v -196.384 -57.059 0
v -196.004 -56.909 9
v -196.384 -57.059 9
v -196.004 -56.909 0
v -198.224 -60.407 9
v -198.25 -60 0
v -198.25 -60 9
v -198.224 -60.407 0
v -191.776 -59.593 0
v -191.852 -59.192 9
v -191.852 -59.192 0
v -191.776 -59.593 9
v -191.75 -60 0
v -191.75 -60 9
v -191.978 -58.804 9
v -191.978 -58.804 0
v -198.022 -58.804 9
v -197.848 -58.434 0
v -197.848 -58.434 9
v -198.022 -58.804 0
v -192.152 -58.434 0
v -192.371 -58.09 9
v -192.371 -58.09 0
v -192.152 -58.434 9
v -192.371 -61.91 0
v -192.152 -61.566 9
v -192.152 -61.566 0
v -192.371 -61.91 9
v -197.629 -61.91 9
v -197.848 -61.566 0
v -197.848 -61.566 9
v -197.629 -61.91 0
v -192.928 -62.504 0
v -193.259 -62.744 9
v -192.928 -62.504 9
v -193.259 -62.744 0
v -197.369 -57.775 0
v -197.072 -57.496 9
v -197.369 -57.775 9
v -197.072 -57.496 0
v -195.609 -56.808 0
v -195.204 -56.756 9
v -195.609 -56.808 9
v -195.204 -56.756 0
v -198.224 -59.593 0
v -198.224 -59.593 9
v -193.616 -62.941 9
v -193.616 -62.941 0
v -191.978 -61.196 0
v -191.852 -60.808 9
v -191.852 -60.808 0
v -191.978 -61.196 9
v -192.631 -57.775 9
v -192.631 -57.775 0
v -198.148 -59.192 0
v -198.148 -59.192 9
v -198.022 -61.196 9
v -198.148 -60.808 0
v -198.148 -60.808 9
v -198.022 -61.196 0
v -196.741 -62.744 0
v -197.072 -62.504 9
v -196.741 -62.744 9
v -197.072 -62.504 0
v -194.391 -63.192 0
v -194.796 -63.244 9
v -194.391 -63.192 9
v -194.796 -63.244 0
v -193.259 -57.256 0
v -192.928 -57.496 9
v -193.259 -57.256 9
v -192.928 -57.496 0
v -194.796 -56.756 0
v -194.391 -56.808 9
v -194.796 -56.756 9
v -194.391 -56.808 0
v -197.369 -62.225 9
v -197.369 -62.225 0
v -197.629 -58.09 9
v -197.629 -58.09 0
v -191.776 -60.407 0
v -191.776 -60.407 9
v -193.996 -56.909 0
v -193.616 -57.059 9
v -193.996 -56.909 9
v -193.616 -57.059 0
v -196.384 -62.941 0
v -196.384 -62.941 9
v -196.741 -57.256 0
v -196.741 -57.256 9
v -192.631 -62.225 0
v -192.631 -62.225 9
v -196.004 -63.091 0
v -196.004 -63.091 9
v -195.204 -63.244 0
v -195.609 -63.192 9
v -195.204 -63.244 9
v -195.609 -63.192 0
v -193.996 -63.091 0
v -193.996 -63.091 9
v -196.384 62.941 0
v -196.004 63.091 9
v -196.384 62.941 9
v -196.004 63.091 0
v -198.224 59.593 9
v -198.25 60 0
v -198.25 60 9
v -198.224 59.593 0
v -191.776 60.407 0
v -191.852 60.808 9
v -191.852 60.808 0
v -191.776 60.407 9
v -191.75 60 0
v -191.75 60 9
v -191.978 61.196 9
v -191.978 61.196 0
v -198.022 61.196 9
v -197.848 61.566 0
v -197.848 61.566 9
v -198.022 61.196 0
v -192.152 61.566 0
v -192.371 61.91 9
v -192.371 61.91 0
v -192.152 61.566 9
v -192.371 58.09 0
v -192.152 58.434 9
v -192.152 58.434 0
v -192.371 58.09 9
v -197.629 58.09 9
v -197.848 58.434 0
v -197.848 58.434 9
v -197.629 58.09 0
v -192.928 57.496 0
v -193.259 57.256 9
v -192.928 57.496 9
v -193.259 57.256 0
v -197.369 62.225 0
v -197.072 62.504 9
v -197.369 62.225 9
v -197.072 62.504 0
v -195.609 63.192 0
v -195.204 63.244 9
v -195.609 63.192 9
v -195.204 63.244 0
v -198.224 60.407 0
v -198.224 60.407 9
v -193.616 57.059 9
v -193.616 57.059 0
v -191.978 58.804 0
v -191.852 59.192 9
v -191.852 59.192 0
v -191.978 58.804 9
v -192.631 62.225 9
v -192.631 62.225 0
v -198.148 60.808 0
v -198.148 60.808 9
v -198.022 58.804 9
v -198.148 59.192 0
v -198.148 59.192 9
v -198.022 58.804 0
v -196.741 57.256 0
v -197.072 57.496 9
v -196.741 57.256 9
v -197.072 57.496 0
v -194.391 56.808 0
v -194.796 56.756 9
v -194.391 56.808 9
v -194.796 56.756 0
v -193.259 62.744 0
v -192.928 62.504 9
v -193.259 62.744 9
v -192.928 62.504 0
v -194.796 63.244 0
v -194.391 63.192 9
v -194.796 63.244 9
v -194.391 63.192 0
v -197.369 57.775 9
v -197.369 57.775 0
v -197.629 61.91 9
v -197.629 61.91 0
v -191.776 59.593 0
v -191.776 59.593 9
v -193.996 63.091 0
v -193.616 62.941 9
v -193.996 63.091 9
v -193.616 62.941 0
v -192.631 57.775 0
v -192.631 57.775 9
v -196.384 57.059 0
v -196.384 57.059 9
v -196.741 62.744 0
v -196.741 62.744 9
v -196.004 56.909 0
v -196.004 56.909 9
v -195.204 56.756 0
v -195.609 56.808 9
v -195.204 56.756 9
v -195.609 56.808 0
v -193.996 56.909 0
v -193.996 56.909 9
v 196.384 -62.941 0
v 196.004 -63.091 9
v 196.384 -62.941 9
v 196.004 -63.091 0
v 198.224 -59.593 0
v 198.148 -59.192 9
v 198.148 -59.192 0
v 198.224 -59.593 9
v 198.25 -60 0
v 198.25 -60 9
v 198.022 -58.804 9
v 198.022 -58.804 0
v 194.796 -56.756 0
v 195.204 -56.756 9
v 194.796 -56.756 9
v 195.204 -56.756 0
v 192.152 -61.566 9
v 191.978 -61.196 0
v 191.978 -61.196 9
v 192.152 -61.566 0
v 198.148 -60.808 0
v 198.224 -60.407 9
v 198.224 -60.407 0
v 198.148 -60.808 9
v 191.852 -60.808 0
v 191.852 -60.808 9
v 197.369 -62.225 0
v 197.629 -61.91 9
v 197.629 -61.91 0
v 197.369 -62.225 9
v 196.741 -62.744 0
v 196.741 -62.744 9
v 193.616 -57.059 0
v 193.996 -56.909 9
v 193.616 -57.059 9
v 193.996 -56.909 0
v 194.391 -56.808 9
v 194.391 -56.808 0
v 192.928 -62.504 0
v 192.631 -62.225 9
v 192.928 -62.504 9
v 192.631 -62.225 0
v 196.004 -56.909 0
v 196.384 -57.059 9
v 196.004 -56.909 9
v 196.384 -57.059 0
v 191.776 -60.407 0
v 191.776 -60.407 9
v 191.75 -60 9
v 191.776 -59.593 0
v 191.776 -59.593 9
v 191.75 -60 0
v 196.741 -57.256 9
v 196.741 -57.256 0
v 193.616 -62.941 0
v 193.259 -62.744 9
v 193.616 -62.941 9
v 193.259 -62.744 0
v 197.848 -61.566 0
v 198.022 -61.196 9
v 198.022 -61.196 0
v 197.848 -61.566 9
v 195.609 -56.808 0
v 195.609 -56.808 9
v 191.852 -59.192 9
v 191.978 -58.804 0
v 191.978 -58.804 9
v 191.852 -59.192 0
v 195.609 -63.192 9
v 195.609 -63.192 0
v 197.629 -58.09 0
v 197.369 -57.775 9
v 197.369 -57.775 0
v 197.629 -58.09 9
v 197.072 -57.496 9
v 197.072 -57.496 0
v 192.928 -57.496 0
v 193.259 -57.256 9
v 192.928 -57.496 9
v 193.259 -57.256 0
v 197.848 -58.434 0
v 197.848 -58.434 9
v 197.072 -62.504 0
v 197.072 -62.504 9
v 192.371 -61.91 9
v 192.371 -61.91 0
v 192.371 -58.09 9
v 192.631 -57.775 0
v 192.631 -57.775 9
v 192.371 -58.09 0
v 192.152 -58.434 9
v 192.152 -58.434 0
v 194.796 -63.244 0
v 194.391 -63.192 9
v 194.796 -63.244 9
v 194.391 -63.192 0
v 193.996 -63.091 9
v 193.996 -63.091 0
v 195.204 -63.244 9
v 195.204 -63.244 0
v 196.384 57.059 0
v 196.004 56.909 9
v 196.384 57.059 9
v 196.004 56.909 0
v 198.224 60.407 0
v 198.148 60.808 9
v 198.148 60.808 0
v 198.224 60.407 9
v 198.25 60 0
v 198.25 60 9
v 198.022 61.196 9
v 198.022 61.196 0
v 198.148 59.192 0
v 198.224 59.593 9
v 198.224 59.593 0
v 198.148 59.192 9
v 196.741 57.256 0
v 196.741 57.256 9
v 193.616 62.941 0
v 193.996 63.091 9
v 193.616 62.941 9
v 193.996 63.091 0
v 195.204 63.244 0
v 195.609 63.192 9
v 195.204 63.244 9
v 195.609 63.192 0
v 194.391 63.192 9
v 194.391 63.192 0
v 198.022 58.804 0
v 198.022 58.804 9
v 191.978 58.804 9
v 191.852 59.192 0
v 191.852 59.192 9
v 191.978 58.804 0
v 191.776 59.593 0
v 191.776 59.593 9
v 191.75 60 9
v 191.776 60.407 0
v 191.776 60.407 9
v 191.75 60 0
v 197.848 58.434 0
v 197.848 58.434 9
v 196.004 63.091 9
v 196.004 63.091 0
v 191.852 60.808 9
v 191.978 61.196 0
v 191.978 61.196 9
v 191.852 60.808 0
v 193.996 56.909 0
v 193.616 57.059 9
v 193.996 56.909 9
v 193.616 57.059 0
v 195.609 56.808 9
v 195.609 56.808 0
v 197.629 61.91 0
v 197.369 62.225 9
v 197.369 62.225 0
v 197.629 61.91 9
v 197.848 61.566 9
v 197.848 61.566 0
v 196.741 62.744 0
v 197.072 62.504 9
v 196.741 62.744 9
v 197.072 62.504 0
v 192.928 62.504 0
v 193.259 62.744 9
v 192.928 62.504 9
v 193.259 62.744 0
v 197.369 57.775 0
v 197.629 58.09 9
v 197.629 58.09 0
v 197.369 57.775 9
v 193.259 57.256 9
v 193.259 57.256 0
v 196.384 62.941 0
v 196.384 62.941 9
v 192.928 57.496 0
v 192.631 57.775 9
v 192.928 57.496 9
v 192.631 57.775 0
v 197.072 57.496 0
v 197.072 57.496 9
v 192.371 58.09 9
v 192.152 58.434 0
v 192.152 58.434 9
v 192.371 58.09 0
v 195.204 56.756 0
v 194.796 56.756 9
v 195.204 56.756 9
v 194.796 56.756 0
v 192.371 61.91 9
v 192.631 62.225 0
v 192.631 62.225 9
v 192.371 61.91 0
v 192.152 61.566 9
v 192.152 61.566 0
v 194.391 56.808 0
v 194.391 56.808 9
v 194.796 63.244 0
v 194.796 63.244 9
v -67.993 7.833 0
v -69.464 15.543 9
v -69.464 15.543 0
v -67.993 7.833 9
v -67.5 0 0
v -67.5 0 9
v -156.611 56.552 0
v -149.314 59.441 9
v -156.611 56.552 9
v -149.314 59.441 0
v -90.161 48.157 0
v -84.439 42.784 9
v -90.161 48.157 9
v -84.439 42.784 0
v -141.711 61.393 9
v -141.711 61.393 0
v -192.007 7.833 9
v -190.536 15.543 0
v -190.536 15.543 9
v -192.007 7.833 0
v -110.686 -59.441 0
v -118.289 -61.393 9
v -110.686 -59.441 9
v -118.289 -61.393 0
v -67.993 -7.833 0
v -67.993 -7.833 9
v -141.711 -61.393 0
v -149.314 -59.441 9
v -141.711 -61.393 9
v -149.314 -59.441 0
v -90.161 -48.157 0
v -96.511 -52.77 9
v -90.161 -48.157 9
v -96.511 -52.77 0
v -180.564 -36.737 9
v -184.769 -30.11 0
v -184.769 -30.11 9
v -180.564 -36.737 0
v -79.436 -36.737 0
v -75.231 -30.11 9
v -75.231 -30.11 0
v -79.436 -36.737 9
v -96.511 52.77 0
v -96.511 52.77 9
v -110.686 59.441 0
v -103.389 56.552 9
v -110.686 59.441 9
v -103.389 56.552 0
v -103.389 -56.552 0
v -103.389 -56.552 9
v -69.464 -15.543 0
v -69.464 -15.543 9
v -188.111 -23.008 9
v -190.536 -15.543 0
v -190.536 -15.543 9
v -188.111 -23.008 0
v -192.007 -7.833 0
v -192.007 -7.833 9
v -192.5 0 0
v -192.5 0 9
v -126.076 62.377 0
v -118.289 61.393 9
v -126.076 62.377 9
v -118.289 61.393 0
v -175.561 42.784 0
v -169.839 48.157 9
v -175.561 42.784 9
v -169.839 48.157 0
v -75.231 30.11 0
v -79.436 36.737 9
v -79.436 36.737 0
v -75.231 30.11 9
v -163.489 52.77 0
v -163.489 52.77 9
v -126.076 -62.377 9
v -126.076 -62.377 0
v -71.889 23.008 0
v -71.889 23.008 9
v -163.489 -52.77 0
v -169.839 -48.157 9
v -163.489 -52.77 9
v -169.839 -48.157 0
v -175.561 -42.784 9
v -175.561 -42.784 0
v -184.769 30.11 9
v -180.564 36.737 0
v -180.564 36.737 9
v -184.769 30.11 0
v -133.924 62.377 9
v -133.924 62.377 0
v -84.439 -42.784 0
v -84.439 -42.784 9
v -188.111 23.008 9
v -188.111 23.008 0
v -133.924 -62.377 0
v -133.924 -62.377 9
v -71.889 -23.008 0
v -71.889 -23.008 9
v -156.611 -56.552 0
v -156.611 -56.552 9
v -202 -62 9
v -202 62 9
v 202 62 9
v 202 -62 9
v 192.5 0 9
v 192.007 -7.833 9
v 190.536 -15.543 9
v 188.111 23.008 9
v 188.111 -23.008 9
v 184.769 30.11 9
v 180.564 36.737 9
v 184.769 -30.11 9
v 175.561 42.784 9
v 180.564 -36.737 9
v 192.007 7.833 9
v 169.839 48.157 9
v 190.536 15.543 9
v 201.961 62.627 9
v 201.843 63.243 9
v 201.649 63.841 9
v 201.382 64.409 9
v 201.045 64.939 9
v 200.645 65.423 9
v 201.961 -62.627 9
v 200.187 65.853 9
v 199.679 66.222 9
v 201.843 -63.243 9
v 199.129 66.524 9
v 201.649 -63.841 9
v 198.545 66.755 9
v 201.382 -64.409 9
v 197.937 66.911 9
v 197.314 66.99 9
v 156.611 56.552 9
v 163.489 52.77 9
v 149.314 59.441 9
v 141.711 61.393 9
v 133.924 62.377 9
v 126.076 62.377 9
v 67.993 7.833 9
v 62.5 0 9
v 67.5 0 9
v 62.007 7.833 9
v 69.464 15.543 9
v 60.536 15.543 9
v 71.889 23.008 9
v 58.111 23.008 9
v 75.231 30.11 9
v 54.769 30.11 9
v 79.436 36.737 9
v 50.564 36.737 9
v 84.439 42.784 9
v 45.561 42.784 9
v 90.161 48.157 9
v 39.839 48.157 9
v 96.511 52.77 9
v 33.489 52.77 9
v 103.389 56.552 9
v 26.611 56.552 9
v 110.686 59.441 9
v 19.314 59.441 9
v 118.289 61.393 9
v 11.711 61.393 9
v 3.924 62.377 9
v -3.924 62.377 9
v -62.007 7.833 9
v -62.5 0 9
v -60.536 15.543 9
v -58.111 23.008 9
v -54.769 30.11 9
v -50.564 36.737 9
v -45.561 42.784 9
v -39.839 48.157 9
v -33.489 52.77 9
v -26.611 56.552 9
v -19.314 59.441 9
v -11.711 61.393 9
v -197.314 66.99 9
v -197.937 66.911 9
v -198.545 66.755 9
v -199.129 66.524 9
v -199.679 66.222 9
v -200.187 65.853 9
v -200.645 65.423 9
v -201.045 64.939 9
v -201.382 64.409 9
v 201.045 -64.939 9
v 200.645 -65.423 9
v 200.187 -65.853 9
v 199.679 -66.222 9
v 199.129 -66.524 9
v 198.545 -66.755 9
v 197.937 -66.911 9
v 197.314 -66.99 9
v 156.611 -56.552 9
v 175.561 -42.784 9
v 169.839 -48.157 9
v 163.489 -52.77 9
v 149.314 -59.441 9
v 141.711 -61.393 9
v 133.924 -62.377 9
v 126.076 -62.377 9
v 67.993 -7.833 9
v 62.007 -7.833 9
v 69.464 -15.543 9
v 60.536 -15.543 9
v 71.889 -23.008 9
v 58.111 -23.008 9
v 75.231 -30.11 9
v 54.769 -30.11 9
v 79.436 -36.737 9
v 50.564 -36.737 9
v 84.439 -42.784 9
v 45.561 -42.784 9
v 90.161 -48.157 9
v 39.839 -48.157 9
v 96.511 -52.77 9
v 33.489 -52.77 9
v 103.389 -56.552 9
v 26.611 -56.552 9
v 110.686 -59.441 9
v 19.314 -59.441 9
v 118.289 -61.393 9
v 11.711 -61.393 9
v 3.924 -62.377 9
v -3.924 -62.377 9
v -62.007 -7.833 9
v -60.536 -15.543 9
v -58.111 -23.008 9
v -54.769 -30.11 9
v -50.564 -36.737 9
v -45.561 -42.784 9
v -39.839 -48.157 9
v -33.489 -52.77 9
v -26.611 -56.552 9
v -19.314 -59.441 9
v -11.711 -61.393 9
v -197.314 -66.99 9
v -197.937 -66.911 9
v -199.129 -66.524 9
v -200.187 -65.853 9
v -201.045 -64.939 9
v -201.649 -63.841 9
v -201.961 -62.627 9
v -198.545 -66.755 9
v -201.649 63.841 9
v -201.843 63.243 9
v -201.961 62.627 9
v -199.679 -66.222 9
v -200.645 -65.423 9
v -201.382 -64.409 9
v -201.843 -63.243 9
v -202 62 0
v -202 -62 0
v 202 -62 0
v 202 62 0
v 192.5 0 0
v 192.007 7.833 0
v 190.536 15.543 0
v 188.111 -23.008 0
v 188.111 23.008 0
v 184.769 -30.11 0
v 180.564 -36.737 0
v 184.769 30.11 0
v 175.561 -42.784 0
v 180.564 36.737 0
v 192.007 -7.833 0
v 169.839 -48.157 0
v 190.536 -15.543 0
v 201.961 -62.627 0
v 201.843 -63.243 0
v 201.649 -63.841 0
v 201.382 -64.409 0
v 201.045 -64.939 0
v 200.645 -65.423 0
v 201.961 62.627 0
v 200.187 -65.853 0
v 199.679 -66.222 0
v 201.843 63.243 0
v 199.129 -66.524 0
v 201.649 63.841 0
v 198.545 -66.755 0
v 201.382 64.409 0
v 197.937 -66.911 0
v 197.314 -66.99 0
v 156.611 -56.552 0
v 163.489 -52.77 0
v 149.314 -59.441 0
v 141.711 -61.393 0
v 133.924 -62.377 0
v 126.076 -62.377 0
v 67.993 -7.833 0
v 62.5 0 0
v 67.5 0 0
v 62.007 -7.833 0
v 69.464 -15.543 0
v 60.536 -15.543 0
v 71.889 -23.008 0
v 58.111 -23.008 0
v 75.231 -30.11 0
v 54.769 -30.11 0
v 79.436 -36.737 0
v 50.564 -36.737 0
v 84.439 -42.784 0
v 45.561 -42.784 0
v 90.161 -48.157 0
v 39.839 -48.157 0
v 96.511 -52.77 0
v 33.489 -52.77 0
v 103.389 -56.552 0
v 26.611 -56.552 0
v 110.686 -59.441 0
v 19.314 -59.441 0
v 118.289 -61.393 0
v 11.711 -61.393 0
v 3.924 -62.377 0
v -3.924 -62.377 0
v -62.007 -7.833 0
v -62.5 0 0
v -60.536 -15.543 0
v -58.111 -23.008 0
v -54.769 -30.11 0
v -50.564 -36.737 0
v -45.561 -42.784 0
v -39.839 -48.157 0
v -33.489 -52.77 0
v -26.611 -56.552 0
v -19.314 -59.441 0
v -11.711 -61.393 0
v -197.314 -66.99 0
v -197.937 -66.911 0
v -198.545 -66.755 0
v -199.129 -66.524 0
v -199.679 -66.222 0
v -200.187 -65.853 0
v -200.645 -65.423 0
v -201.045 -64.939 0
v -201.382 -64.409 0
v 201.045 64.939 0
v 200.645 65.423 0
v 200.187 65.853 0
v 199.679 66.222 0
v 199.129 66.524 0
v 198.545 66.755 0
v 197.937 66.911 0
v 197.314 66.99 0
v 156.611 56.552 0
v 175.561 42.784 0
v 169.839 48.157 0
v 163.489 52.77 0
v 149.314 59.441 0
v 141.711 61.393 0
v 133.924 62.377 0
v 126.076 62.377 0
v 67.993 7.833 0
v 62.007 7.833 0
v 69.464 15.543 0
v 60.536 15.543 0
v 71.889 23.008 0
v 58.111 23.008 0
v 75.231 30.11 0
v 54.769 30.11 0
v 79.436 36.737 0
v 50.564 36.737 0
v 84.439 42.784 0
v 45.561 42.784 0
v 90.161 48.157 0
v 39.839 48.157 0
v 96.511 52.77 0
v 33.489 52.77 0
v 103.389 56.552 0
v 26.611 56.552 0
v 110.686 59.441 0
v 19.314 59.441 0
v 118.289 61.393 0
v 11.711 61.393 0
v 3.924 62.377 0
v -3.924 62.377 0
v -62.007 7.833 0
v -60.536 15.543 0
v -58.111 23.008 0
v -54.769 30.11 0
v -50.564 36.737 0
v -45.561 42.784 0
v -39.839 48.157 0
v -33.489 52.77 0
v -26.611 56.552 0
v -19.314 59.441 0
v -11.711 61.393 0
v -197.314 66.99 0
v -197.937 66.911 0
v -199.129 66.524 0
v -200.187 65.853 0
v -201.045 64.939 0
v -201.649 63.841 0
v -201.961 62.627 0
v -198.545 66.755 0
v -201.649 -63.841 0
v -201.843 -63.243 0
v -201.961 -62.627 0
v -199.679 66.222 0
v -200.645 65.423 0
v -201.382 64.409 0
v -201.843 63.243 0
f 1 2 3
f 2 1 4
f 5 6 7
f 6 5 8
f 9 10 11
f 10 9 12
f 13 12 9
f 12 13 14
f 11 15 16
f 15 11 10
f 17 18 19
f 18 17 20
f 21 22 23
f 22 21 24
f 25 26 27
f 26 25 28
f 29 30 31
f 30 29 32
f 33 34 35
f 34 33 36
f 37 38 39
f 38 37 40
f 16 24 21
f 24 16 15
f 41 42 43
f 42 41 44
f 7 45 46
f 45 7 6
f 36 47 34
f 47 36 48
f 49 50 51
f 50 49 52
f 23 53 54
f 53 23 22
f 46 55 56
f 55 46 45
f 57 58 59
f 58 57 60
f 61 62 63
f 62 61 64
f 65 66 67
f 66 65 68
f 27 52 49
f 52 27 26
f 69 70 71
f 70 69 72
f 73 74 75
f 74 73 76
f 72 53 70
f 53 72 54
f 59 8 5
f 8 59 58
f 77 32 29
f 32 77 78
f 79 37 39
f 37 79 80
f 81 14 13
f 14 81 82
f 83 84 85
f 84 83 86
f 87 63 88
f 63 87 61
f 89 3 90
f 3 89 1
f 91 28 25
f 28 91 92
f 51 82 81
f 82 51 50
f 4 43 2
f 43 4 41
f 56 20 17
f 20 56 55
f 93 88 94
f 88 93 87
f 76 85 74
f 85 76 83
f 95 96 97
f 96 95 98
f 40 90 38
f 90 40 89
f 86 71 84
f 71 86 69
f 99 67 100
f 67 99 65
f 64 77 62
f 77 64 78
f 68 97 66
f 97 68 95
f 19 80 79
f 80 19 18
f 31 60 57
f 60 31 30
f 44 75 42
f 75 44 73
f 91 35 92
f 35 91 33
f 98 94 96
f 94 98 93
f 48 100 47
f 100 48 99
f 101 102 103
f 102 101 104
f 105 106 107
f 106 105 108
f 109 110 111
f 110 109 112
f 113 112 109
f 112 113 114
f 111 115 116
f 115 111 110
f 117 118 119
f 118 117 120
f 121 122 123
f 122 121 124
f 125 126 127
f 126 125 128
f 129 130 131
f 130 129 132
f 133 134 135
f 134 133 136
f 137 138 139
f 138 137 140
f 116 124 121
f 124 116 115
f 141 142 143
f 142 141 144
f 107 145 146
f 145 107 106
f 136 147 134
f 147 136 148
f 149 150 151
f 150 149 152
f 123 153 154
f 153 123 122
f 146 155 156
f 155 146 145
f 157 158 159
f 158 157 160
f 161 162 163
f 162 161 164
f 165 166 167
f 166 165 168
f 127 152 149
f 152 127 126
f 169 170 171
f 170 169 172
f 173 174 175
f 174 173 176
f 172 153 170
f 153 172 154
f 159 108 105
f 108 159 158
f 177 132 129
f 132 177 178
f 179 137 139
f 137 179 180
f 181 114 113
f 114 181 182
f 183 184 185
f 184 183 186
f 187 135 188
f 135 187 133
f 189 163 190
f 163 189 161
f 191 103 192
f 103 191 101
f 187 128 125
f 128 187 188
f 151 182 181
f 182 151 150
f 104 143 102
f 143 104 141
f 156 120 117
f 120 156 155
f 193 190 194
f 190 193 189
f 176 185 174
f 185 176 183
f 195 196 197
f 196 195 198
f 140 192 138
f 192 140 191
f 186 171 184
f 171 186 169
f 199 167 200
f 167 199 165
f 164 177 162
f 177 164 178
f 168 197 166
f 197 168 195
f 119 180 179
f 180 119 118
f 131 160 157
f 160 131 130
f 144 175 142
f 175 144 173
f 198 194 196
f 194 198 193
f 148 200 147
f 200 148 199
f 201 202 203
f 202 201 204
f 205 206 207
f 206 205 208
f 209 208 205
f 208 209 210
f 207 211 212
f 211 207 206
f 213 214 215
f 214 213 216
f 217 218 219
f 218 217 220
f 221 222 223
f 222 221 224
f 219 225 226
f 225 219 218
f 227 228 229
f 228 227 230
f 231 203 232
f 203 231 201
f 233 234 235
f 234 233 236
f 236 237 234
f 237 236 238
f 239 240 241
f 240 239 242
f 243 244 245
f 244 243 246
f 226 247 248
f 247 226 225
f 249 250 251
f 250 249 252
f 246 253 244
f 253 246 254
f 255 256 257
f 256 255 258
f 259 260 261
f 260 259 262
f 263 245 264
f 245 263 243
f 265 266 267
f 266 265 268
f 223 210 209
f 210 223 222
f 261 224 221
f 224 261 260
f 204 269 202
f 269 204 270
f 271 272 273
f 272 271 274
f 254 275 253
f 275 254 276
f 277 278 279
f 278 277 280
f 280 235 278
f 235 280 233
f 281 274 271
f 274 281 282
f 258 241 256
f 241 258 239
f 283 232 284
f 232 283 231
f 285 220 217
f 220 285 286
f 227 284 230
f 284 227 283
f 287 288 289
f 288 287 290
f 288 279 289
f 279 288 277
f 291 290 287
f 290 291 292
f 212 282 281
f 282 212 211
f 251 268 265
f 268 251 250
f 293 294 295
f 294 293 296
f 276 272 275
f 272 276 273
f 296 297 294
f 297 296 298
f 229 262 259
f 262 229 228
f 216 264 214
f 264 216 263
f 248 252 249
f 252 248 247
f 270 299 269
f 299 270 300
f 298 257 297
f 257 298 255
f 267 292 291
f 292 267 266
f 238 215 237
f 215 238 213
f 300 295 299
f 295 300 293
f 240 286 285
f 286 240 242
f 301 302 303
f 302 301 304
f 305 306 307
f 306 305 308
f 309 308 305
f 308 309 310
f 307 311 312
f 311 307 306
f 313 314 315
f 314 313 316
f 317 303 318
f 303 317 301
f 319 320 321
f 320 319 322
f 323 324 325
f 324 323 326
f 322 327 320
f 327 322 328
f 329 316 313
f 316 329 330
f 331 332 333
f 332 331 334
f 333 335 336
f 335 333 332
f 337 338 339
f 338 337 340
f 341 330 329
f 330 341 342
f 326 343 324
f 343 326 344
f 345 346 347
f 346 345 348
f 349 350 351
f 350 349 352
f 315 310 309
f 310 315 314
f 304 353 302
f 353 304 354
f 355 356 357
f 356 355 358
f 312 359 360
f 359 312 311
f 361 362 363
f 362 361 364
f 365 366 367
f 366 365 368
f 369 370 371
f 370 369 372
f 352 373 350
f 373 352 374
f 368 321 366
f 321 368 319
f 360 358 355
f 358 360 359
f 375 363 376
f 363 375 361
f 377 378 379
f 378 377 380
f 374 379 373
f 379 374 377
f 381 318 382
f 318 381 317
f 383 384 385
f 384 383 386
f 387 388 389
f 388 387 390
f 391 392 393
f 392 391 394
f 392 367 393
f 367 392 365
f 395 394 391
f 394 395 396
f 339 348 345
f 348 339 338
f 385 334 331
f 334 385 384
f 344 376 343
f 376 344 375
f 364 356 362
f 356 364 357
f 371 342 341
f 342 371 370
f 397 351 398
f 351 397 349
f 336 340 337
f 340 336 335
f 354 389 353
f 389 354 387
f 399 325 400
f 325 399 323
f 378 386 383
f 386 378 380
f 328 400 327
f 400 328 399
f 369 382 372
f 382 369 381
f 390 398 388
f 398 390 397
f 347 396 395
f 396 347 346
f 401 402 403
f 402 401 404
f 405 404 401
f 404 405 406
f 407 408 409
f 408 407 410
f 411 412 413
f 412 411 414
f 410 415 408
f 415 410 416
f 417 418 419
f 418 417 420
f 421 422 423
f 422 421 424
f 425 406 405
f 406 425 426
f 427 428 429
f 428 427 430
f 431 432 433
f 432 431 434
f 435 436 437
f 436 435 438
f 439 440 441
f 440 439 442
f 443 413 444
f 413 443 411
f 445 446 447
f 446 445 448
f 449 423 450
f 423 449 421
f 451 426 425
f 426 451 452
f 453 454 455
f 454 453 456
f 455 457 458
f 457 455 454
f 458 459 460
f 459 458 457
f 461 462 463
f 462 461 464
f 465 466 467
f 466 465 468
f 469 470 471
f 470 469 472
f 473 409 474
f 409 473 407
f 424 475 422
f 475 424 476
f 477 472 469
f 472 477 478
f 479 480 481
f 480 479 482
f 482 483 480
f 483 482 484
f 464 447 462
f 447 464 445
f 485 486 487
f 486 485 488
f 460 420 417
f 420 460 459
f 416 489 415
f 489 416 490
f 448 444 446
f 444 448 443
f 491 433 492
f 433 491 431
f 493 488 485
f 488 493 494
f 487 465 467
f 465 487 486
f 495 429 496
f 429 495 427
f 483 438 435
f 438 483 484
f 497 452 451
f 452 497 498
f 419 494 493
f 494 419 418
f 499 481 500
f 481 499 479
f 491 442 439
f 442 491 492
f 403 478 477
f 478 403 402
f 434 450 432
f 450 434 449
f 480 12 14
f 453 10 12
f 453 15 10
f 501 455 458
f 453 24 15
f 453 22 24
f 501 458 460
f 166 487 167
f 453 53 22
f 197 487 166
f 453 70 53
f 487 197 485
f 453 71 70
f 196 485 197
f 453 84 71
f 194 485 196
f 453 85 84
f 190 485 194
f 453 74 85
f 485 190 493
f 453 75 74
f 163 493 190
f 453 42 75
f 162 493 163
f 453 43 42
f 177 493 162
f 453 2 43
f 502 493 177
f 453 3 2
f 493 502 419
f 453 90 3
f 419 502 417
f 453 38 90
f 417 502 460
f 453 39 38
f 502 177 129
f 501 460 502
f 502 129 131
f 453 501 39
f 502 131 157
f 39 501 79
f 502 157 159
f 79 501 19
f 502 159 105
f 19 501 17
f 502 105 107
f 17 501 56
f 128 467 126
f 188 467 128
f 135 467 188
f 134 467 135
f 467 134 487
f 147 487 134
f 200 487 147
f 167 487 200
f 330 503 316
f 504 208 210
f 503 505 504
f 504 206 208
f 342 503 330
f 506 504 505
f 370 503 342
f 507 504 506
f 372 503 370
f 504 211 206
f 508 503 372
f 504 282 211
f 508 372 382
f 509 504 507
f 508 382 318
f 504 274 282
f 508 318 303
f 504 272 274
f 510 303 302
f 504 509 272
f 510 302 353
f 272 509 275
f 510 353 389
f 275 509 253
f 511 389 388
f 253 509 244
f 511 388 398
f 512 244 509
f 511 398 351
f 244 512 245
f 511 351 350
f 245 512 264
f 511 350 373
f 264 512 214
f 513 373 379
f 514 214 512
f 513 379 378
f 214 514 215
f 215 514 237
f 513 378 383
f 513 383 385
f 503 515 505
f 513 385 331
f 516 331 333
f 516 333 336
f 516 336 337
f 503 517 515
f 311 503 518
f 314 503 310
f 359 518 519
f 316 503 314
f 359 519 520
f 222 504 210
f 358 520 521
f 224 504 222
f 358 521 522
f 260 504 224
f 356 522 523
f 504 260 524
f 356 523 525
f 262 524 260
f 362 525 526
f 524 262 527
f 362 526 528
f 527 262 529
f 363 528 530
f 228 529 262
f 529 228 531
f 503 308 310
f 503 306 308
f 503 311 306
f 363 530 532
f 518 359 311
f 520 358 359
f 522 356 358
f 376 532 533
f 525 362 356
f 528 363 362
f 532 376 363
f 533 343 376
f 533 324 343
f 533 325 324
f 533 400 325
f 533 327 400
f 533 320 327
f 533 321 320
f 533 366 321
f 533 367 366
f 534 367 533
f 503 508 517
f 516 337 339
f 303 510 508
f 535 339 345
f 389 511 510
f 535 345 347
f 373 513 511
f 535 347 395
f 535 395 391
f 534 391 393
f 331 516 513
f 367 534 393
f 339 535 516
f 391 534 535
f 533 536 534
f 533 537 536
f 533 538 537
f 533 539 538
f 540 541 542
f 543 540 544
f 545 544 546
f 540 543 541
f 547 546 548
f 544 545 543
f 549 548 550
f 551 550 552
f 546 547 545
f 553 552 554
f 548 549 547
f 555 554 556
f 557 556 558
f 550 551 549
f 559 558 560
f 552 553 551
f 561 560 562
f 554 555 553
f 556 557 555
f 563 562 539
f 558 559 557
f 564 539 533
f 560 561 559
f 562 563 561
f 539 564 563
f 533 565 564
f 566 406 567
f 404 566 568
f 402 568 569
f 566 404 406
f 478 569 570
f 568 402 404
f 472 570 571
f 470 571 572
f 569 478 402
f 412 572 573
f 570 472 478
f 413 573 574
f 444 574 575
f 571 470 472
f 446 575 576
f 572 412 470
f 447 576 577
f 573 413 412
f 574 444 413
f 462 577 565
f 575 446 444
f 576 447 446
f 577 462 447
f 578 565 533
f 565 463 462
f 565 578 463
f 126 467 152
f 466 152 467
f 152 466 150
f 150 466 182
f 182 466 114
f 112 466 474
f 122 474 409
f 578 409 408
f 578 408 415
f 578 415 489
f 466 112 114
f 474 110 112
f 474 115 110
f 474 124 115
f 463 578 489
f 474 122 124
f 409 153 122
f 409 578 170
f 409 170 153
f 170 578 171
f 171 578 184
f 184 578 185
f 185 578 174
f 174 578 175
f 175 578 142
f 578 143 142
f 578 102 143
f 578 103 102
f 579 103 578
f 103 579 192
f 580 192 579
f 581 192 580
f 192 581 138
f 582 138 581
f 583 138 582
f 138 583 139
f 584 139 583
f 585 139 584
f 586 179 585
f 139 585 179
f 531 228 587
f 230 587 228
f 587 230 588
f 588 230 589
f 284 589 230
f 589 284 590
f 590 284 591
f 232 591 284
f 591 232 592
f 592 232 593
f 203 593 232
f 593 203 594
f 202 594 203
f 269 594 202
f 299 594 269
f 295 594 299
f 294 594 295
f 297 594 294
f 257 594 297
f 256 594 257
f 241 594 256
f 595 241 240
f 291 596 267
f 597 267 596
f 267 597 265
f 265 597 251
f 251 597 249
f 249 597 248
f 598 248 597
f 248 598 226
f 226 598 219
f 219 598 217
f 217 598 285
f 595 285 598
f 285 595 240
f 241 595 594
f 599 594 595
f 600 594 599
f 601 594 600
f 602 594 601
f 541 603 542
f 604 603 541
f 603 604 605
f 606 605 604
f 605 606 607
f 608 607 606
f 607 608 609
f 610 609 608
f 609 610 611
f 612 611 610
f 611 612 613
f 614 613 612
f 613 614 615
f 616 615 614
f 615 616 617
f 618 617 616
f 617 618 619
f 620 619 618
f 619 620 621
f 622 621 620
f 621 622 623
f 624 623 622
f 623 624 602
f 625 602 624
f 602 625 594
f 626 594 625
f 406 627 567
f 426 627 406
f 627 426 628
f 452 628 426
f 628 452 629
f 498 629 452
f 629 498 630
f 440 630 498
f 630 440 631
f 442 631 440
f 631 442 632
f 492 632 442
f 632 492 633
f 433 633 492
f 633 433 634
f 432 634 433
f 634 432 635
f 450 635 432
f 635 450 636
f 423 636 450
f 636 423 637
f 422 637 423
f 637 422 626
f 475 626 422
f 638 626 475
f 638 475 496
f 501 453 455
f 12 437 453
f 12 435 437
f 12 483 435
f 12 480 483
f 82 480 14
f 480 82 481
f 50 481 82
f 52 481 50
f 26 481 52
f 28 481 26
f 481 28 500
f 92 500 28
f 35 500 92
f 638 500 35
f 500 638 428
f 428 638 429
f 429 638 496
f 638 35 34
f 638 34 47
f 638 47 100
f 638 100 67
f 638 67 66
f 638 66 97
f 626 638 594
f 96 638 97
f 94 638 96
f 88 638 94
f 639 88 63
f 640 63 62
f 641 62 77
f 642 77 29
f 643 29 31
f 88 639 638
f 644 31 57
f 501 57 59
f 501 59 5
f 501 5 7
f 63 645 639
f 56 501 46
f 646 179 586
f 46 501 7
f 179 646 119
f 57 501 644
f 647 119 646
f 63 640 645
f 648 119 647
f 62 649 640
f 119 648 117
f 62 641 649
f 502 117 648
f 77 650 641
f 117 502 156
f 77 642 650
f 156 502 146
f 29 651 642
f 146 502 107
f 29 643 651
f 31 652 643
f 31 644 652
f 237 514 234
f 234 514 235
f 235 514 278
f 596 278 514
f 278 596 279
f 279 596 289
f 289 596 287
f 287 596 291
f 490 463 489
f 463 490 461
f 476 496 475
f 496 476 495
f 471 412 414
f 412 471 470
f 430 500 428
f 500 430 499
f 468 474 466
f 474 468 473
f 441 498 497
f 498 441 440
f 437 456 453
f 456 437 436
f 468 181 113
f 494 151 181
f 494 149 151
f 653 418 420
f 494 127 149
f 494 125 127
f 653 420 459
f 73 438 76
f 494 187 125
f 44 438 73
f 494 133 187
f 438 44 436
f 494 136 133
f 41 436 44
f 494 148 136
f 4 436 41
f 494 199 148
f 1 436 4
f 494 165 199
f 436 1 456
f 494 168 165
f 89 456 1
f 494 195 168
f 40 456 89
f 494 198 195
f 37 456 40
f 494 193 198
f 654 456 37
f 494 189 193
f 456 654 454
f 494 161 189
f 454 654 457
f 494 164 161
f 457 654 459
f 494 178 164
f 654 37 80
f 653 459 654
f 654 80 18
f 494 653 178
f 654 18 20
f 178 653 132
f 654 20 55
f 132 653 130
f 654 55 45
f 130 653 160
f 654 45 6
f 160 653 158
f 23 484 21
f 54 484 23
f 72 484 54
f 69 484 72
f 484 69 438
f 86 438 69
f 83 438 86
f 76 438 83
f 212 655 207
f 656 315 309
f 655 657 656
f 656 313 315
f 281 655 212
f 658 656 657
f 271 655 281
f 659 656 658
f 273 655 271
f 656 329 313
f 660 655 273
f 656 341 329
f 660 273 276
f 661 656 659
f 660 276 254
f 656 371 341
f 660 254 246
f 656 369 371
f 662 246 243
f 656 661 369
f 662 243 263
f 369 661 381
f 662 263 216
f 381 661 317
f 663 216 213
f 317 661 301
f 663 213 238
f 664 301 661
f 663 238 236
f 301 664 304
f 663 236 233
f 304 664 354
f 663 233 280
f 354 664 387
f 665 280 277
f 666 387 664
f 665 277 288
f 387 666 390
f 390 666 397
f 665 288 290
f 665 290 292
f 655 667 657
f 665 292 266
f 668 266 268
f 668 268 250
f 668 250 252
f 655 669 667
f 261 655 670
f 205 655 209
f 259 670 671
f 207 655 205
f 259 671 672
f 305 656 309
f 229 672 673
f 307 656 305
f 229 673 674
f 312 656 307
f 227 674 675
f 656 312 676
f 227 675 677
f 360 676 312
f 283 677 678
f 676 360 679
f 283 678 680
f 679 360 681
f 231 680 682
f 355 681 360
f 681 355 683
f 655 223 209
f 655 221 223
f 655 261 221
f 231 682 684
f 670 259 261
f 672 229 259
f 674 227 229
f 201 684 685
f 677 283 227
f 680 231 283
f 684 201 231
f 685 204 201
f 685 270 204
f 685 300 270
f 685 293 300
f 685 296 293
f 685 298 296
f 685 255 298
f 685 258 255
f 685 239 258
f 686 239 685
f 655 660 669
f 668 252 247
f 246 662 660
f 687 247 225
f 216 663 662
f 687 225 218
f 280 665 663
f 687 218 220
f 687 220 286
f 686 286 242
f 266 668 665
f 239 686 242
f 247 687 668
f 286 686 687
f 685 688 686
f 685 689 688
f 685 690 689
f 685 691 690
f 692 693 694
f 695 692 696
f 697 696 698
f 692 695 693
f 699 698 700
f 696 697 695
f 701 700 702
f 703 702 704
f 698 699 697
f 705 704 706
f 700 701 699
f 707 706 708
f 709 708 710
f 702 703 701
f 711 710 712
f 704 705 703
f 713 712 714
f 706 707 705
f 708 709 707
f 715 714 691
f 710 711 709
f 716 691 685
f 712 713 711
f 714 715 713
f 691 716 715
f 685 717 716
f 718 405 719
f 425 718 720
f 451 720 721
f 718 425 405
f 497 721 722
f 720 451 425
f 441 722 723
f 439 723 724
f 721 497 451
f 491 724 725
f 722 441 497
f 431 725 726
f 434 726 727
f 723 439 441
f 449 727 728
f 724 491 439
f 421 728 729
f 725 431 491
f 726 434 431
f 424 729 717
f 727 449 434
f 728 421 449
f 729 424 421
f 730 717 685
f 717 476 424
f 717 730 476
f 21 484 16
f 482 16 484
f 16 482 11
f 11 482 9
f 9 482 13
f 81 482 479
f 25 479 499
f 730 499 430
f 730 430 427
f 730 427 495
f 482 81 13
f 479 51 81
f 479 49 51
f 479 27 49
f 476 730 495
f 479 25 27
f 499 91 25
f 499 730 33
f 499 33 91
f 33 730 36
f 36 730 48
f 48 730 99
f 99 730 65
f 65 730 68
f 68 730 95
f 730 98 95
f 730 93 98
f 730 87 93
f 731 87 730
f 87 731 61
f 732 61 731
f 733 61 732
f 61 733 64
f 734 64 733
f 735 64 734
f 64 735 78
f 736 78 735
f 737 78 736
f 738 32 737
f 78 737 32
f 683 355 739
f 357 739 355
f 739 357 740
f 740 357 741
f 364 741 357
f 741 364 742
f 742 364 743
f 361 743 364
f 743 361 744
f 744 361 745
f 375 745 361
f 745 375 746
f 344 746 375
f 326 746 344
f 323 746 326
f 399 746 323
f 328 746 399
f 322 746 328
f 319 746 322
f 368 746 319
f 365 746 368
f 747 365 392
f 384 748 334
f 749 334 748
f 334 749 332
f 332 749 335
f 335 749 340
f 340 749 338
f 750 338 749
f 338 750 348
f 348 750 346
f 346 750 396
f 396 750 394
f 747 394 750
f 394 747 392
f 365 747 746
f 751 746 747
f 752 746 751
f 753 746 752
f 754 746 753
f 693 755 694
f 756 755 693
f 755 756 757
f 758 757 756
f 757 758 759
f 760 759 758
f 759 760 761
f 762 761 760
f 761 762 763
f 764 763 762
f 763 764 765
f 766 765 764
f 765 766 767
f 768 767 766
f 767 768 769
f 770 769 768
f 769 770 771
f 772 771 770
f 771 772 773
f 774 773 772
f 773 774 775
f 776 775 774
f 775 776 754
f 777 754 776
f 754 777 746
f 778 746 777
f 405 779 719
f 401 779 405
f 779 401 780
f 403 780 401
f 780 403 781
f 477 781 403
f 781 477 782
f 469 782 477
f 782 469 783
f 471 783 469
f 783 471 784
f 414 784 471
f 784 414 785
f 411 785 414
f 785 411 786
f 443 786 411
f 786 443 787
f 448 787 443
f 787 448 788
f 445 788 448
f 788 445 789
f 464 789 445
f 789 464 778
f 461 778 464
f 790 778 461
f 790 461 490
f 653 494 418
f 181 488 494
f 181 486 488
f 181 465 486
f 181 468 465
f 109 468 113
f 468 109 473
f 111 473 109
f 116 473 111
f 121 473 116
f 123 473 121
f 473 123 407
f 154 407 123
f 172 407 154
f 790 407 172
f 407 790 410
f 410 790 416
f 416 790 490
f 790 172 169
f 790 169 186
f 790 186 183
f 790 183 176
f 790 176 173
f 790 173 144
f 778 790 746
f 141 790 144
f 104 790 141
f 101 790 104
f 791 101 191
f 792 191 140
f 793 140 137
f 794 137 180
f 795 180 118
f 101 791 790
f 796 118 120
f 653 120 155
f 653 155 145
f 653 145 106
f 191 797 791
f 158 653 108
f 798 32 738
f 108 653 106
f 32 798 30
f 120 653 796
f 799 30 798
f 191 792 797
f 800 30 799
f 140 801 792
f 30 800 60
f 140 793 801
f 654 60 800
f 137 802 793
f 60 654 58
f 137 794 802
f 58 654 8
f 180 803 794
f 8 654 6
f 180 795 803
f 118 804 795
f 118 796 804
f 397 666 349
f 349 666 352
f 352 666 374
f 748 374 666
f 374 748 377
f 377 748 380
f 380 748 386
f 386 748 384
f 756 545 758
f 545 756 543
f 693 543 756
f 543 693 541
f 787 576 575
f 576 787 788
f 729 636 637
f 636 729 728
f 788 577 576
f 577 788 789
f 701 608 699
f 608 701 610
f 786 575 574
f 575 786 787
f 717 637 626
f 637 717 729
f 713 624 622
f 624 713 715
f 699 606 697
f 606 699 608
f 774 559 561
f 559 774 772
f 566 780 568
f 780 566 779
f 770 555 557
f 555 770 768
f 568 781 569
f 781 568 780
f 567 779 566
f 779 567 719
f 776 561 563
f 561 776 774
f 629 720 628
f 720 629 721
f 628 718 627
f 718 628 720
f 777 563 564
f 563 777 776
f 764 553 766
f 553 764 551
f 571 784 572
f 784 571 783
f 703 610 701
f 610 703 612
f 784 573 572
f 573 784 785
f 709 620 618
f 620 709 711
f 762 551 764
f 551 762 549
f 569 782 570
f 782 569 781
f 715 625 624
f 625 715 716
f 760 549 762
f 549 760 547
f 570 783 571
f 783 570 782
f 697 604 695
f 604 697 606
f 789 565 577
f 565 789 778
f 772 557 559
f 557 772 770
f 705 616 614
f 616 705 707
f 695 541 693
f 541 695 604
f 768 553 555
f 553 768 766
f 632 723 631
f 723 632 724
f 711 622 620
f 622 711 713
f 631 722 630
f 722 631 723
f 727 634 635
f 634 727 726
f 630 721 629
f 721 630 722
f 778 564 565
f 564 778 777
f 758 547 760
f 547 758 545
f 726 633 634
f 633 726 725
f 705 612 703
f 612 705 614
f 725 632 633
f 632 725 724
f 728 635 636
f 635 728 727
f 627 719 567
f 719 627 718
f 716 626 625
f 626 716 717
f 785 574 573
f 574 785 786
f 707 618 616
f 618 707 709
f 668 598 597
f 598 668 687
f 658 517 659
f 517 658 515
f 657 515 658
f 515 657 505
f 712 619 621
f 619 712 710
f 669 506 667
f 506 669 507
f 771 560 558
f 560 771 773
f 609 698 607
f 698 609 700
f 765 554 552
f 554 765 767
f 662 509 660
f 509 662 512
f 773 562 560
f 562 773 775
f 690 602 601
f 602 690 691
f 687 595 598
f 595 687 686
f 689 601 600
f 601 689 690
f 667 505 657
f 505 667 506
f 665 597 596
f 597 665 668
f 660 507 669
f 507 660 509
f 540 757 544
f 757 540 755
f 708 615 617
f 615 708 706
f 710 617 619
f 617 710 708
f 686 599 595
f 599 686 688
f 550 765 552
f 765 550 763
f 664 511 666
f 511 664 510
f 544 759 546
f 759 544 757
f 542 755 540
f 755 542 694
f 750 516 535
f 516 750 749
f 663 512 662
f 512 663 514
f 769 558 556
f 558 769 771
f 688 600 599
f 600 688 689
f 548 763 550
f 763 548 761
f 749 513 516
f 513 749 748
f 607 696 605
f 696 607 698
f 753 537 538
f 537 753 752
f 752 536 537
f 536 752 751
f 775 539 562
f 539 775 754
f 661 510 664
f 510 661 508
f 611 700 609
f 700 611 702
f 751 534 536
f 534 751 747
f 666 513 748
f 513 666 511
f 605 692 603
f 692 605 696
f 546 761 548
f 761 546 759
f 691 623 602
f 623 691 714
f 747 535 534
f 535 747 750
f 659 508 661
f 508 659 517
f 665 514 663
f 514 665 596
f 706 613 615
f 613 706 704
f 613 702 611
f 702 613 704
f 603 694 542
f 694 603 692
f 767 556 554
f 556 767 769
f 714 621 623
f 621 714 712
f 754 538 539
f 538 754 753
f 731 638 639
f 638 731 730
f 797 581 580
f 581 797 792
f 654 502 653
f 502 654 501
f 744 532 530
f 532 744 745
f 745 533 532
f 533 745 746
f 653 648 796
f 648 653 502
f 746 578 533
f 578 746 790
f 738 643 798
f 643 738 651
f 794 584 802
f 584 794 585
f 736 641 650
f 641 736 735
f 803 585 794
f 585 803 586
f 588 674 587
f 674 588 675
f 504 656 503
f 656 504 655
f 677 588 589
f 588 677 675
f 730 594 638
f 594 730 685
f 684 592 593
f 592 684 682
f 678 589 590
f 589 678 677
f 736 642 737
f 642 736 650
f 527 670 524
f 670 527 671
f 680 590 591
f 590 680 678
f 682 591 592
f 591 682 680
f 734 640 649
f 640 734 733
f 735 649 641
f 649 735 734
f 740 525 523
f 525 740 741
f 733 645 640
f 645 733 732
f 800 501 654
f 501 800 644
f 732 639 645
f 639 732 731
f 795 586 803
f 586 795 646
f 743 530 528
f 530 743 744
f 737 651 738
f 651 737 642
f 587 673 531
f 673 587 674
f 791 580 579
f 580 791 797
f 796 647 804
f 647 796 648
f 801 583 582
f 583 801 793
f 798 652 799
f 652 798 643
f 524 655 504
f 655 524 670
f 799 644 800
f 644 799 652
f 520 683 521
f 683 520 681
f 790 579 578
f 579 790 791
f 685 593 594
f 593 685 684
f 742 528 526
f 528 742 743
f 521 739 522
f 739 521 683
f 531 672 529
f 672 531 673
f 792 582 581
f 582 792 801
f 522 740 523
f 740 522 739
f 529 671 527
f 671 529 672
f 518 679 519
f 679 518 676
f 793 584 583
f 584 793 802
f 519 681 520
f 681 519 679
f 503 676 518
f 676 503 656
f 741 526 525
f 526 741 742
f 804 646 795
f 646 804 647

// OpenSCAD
$fn = 50;


difference() {
	union() {
		hull() {
			translate(v = [-197.0000000000, 62.0000000000, 0]) {
				cylinder(h = 9, r = 5);
			}
			translate(v = [197.0000000000, 62.0000000000, 0]) {
				cylinder(h = 9, r = 5);
			}
			translate(v = [-197.0000000000, -62.0000000000, 0]) {
				cylinder(h = 9, r = 5);
			}
			translate(v = [197.0000000000, -62.0000000000, 0]) {
				cylinder(h = 9, r = 5);
			}
		}
	}
	union() {
		#translate(v = [-195.0000000000, -60.0000000000, -100.0000000000]) {
			cylinder(h = 200, r = 3.2500000000);
		}
		#translate(v = [-195.0000000000, 60.0000000000, -100.0000000000]) {
			cylinder(h = 200, r = 3.2500000000);
		}
		#translate(v = [195.0000000000, -60.0000000000, -100.0000000000]) {
			cylinder(h = 200, r = 3.2500000000);
		}
		#translate(v = [195.0000000000, 60.0000000000, -100.0000000000]) {
			cylinder(h = 200, r = 3.2500000000);
		}
		#translate(v = [-130.0000000000, 0, 0]) {
			cylinder(h = 9, r = 62.5000000000);
		}
		#cylinder(h = 9, r = 62.5000000000);
		#translate(v = [130.0000000000, 0, 0]) {
			cylinder(h = 9, r = 62.5000000000);
		}
	}
}
